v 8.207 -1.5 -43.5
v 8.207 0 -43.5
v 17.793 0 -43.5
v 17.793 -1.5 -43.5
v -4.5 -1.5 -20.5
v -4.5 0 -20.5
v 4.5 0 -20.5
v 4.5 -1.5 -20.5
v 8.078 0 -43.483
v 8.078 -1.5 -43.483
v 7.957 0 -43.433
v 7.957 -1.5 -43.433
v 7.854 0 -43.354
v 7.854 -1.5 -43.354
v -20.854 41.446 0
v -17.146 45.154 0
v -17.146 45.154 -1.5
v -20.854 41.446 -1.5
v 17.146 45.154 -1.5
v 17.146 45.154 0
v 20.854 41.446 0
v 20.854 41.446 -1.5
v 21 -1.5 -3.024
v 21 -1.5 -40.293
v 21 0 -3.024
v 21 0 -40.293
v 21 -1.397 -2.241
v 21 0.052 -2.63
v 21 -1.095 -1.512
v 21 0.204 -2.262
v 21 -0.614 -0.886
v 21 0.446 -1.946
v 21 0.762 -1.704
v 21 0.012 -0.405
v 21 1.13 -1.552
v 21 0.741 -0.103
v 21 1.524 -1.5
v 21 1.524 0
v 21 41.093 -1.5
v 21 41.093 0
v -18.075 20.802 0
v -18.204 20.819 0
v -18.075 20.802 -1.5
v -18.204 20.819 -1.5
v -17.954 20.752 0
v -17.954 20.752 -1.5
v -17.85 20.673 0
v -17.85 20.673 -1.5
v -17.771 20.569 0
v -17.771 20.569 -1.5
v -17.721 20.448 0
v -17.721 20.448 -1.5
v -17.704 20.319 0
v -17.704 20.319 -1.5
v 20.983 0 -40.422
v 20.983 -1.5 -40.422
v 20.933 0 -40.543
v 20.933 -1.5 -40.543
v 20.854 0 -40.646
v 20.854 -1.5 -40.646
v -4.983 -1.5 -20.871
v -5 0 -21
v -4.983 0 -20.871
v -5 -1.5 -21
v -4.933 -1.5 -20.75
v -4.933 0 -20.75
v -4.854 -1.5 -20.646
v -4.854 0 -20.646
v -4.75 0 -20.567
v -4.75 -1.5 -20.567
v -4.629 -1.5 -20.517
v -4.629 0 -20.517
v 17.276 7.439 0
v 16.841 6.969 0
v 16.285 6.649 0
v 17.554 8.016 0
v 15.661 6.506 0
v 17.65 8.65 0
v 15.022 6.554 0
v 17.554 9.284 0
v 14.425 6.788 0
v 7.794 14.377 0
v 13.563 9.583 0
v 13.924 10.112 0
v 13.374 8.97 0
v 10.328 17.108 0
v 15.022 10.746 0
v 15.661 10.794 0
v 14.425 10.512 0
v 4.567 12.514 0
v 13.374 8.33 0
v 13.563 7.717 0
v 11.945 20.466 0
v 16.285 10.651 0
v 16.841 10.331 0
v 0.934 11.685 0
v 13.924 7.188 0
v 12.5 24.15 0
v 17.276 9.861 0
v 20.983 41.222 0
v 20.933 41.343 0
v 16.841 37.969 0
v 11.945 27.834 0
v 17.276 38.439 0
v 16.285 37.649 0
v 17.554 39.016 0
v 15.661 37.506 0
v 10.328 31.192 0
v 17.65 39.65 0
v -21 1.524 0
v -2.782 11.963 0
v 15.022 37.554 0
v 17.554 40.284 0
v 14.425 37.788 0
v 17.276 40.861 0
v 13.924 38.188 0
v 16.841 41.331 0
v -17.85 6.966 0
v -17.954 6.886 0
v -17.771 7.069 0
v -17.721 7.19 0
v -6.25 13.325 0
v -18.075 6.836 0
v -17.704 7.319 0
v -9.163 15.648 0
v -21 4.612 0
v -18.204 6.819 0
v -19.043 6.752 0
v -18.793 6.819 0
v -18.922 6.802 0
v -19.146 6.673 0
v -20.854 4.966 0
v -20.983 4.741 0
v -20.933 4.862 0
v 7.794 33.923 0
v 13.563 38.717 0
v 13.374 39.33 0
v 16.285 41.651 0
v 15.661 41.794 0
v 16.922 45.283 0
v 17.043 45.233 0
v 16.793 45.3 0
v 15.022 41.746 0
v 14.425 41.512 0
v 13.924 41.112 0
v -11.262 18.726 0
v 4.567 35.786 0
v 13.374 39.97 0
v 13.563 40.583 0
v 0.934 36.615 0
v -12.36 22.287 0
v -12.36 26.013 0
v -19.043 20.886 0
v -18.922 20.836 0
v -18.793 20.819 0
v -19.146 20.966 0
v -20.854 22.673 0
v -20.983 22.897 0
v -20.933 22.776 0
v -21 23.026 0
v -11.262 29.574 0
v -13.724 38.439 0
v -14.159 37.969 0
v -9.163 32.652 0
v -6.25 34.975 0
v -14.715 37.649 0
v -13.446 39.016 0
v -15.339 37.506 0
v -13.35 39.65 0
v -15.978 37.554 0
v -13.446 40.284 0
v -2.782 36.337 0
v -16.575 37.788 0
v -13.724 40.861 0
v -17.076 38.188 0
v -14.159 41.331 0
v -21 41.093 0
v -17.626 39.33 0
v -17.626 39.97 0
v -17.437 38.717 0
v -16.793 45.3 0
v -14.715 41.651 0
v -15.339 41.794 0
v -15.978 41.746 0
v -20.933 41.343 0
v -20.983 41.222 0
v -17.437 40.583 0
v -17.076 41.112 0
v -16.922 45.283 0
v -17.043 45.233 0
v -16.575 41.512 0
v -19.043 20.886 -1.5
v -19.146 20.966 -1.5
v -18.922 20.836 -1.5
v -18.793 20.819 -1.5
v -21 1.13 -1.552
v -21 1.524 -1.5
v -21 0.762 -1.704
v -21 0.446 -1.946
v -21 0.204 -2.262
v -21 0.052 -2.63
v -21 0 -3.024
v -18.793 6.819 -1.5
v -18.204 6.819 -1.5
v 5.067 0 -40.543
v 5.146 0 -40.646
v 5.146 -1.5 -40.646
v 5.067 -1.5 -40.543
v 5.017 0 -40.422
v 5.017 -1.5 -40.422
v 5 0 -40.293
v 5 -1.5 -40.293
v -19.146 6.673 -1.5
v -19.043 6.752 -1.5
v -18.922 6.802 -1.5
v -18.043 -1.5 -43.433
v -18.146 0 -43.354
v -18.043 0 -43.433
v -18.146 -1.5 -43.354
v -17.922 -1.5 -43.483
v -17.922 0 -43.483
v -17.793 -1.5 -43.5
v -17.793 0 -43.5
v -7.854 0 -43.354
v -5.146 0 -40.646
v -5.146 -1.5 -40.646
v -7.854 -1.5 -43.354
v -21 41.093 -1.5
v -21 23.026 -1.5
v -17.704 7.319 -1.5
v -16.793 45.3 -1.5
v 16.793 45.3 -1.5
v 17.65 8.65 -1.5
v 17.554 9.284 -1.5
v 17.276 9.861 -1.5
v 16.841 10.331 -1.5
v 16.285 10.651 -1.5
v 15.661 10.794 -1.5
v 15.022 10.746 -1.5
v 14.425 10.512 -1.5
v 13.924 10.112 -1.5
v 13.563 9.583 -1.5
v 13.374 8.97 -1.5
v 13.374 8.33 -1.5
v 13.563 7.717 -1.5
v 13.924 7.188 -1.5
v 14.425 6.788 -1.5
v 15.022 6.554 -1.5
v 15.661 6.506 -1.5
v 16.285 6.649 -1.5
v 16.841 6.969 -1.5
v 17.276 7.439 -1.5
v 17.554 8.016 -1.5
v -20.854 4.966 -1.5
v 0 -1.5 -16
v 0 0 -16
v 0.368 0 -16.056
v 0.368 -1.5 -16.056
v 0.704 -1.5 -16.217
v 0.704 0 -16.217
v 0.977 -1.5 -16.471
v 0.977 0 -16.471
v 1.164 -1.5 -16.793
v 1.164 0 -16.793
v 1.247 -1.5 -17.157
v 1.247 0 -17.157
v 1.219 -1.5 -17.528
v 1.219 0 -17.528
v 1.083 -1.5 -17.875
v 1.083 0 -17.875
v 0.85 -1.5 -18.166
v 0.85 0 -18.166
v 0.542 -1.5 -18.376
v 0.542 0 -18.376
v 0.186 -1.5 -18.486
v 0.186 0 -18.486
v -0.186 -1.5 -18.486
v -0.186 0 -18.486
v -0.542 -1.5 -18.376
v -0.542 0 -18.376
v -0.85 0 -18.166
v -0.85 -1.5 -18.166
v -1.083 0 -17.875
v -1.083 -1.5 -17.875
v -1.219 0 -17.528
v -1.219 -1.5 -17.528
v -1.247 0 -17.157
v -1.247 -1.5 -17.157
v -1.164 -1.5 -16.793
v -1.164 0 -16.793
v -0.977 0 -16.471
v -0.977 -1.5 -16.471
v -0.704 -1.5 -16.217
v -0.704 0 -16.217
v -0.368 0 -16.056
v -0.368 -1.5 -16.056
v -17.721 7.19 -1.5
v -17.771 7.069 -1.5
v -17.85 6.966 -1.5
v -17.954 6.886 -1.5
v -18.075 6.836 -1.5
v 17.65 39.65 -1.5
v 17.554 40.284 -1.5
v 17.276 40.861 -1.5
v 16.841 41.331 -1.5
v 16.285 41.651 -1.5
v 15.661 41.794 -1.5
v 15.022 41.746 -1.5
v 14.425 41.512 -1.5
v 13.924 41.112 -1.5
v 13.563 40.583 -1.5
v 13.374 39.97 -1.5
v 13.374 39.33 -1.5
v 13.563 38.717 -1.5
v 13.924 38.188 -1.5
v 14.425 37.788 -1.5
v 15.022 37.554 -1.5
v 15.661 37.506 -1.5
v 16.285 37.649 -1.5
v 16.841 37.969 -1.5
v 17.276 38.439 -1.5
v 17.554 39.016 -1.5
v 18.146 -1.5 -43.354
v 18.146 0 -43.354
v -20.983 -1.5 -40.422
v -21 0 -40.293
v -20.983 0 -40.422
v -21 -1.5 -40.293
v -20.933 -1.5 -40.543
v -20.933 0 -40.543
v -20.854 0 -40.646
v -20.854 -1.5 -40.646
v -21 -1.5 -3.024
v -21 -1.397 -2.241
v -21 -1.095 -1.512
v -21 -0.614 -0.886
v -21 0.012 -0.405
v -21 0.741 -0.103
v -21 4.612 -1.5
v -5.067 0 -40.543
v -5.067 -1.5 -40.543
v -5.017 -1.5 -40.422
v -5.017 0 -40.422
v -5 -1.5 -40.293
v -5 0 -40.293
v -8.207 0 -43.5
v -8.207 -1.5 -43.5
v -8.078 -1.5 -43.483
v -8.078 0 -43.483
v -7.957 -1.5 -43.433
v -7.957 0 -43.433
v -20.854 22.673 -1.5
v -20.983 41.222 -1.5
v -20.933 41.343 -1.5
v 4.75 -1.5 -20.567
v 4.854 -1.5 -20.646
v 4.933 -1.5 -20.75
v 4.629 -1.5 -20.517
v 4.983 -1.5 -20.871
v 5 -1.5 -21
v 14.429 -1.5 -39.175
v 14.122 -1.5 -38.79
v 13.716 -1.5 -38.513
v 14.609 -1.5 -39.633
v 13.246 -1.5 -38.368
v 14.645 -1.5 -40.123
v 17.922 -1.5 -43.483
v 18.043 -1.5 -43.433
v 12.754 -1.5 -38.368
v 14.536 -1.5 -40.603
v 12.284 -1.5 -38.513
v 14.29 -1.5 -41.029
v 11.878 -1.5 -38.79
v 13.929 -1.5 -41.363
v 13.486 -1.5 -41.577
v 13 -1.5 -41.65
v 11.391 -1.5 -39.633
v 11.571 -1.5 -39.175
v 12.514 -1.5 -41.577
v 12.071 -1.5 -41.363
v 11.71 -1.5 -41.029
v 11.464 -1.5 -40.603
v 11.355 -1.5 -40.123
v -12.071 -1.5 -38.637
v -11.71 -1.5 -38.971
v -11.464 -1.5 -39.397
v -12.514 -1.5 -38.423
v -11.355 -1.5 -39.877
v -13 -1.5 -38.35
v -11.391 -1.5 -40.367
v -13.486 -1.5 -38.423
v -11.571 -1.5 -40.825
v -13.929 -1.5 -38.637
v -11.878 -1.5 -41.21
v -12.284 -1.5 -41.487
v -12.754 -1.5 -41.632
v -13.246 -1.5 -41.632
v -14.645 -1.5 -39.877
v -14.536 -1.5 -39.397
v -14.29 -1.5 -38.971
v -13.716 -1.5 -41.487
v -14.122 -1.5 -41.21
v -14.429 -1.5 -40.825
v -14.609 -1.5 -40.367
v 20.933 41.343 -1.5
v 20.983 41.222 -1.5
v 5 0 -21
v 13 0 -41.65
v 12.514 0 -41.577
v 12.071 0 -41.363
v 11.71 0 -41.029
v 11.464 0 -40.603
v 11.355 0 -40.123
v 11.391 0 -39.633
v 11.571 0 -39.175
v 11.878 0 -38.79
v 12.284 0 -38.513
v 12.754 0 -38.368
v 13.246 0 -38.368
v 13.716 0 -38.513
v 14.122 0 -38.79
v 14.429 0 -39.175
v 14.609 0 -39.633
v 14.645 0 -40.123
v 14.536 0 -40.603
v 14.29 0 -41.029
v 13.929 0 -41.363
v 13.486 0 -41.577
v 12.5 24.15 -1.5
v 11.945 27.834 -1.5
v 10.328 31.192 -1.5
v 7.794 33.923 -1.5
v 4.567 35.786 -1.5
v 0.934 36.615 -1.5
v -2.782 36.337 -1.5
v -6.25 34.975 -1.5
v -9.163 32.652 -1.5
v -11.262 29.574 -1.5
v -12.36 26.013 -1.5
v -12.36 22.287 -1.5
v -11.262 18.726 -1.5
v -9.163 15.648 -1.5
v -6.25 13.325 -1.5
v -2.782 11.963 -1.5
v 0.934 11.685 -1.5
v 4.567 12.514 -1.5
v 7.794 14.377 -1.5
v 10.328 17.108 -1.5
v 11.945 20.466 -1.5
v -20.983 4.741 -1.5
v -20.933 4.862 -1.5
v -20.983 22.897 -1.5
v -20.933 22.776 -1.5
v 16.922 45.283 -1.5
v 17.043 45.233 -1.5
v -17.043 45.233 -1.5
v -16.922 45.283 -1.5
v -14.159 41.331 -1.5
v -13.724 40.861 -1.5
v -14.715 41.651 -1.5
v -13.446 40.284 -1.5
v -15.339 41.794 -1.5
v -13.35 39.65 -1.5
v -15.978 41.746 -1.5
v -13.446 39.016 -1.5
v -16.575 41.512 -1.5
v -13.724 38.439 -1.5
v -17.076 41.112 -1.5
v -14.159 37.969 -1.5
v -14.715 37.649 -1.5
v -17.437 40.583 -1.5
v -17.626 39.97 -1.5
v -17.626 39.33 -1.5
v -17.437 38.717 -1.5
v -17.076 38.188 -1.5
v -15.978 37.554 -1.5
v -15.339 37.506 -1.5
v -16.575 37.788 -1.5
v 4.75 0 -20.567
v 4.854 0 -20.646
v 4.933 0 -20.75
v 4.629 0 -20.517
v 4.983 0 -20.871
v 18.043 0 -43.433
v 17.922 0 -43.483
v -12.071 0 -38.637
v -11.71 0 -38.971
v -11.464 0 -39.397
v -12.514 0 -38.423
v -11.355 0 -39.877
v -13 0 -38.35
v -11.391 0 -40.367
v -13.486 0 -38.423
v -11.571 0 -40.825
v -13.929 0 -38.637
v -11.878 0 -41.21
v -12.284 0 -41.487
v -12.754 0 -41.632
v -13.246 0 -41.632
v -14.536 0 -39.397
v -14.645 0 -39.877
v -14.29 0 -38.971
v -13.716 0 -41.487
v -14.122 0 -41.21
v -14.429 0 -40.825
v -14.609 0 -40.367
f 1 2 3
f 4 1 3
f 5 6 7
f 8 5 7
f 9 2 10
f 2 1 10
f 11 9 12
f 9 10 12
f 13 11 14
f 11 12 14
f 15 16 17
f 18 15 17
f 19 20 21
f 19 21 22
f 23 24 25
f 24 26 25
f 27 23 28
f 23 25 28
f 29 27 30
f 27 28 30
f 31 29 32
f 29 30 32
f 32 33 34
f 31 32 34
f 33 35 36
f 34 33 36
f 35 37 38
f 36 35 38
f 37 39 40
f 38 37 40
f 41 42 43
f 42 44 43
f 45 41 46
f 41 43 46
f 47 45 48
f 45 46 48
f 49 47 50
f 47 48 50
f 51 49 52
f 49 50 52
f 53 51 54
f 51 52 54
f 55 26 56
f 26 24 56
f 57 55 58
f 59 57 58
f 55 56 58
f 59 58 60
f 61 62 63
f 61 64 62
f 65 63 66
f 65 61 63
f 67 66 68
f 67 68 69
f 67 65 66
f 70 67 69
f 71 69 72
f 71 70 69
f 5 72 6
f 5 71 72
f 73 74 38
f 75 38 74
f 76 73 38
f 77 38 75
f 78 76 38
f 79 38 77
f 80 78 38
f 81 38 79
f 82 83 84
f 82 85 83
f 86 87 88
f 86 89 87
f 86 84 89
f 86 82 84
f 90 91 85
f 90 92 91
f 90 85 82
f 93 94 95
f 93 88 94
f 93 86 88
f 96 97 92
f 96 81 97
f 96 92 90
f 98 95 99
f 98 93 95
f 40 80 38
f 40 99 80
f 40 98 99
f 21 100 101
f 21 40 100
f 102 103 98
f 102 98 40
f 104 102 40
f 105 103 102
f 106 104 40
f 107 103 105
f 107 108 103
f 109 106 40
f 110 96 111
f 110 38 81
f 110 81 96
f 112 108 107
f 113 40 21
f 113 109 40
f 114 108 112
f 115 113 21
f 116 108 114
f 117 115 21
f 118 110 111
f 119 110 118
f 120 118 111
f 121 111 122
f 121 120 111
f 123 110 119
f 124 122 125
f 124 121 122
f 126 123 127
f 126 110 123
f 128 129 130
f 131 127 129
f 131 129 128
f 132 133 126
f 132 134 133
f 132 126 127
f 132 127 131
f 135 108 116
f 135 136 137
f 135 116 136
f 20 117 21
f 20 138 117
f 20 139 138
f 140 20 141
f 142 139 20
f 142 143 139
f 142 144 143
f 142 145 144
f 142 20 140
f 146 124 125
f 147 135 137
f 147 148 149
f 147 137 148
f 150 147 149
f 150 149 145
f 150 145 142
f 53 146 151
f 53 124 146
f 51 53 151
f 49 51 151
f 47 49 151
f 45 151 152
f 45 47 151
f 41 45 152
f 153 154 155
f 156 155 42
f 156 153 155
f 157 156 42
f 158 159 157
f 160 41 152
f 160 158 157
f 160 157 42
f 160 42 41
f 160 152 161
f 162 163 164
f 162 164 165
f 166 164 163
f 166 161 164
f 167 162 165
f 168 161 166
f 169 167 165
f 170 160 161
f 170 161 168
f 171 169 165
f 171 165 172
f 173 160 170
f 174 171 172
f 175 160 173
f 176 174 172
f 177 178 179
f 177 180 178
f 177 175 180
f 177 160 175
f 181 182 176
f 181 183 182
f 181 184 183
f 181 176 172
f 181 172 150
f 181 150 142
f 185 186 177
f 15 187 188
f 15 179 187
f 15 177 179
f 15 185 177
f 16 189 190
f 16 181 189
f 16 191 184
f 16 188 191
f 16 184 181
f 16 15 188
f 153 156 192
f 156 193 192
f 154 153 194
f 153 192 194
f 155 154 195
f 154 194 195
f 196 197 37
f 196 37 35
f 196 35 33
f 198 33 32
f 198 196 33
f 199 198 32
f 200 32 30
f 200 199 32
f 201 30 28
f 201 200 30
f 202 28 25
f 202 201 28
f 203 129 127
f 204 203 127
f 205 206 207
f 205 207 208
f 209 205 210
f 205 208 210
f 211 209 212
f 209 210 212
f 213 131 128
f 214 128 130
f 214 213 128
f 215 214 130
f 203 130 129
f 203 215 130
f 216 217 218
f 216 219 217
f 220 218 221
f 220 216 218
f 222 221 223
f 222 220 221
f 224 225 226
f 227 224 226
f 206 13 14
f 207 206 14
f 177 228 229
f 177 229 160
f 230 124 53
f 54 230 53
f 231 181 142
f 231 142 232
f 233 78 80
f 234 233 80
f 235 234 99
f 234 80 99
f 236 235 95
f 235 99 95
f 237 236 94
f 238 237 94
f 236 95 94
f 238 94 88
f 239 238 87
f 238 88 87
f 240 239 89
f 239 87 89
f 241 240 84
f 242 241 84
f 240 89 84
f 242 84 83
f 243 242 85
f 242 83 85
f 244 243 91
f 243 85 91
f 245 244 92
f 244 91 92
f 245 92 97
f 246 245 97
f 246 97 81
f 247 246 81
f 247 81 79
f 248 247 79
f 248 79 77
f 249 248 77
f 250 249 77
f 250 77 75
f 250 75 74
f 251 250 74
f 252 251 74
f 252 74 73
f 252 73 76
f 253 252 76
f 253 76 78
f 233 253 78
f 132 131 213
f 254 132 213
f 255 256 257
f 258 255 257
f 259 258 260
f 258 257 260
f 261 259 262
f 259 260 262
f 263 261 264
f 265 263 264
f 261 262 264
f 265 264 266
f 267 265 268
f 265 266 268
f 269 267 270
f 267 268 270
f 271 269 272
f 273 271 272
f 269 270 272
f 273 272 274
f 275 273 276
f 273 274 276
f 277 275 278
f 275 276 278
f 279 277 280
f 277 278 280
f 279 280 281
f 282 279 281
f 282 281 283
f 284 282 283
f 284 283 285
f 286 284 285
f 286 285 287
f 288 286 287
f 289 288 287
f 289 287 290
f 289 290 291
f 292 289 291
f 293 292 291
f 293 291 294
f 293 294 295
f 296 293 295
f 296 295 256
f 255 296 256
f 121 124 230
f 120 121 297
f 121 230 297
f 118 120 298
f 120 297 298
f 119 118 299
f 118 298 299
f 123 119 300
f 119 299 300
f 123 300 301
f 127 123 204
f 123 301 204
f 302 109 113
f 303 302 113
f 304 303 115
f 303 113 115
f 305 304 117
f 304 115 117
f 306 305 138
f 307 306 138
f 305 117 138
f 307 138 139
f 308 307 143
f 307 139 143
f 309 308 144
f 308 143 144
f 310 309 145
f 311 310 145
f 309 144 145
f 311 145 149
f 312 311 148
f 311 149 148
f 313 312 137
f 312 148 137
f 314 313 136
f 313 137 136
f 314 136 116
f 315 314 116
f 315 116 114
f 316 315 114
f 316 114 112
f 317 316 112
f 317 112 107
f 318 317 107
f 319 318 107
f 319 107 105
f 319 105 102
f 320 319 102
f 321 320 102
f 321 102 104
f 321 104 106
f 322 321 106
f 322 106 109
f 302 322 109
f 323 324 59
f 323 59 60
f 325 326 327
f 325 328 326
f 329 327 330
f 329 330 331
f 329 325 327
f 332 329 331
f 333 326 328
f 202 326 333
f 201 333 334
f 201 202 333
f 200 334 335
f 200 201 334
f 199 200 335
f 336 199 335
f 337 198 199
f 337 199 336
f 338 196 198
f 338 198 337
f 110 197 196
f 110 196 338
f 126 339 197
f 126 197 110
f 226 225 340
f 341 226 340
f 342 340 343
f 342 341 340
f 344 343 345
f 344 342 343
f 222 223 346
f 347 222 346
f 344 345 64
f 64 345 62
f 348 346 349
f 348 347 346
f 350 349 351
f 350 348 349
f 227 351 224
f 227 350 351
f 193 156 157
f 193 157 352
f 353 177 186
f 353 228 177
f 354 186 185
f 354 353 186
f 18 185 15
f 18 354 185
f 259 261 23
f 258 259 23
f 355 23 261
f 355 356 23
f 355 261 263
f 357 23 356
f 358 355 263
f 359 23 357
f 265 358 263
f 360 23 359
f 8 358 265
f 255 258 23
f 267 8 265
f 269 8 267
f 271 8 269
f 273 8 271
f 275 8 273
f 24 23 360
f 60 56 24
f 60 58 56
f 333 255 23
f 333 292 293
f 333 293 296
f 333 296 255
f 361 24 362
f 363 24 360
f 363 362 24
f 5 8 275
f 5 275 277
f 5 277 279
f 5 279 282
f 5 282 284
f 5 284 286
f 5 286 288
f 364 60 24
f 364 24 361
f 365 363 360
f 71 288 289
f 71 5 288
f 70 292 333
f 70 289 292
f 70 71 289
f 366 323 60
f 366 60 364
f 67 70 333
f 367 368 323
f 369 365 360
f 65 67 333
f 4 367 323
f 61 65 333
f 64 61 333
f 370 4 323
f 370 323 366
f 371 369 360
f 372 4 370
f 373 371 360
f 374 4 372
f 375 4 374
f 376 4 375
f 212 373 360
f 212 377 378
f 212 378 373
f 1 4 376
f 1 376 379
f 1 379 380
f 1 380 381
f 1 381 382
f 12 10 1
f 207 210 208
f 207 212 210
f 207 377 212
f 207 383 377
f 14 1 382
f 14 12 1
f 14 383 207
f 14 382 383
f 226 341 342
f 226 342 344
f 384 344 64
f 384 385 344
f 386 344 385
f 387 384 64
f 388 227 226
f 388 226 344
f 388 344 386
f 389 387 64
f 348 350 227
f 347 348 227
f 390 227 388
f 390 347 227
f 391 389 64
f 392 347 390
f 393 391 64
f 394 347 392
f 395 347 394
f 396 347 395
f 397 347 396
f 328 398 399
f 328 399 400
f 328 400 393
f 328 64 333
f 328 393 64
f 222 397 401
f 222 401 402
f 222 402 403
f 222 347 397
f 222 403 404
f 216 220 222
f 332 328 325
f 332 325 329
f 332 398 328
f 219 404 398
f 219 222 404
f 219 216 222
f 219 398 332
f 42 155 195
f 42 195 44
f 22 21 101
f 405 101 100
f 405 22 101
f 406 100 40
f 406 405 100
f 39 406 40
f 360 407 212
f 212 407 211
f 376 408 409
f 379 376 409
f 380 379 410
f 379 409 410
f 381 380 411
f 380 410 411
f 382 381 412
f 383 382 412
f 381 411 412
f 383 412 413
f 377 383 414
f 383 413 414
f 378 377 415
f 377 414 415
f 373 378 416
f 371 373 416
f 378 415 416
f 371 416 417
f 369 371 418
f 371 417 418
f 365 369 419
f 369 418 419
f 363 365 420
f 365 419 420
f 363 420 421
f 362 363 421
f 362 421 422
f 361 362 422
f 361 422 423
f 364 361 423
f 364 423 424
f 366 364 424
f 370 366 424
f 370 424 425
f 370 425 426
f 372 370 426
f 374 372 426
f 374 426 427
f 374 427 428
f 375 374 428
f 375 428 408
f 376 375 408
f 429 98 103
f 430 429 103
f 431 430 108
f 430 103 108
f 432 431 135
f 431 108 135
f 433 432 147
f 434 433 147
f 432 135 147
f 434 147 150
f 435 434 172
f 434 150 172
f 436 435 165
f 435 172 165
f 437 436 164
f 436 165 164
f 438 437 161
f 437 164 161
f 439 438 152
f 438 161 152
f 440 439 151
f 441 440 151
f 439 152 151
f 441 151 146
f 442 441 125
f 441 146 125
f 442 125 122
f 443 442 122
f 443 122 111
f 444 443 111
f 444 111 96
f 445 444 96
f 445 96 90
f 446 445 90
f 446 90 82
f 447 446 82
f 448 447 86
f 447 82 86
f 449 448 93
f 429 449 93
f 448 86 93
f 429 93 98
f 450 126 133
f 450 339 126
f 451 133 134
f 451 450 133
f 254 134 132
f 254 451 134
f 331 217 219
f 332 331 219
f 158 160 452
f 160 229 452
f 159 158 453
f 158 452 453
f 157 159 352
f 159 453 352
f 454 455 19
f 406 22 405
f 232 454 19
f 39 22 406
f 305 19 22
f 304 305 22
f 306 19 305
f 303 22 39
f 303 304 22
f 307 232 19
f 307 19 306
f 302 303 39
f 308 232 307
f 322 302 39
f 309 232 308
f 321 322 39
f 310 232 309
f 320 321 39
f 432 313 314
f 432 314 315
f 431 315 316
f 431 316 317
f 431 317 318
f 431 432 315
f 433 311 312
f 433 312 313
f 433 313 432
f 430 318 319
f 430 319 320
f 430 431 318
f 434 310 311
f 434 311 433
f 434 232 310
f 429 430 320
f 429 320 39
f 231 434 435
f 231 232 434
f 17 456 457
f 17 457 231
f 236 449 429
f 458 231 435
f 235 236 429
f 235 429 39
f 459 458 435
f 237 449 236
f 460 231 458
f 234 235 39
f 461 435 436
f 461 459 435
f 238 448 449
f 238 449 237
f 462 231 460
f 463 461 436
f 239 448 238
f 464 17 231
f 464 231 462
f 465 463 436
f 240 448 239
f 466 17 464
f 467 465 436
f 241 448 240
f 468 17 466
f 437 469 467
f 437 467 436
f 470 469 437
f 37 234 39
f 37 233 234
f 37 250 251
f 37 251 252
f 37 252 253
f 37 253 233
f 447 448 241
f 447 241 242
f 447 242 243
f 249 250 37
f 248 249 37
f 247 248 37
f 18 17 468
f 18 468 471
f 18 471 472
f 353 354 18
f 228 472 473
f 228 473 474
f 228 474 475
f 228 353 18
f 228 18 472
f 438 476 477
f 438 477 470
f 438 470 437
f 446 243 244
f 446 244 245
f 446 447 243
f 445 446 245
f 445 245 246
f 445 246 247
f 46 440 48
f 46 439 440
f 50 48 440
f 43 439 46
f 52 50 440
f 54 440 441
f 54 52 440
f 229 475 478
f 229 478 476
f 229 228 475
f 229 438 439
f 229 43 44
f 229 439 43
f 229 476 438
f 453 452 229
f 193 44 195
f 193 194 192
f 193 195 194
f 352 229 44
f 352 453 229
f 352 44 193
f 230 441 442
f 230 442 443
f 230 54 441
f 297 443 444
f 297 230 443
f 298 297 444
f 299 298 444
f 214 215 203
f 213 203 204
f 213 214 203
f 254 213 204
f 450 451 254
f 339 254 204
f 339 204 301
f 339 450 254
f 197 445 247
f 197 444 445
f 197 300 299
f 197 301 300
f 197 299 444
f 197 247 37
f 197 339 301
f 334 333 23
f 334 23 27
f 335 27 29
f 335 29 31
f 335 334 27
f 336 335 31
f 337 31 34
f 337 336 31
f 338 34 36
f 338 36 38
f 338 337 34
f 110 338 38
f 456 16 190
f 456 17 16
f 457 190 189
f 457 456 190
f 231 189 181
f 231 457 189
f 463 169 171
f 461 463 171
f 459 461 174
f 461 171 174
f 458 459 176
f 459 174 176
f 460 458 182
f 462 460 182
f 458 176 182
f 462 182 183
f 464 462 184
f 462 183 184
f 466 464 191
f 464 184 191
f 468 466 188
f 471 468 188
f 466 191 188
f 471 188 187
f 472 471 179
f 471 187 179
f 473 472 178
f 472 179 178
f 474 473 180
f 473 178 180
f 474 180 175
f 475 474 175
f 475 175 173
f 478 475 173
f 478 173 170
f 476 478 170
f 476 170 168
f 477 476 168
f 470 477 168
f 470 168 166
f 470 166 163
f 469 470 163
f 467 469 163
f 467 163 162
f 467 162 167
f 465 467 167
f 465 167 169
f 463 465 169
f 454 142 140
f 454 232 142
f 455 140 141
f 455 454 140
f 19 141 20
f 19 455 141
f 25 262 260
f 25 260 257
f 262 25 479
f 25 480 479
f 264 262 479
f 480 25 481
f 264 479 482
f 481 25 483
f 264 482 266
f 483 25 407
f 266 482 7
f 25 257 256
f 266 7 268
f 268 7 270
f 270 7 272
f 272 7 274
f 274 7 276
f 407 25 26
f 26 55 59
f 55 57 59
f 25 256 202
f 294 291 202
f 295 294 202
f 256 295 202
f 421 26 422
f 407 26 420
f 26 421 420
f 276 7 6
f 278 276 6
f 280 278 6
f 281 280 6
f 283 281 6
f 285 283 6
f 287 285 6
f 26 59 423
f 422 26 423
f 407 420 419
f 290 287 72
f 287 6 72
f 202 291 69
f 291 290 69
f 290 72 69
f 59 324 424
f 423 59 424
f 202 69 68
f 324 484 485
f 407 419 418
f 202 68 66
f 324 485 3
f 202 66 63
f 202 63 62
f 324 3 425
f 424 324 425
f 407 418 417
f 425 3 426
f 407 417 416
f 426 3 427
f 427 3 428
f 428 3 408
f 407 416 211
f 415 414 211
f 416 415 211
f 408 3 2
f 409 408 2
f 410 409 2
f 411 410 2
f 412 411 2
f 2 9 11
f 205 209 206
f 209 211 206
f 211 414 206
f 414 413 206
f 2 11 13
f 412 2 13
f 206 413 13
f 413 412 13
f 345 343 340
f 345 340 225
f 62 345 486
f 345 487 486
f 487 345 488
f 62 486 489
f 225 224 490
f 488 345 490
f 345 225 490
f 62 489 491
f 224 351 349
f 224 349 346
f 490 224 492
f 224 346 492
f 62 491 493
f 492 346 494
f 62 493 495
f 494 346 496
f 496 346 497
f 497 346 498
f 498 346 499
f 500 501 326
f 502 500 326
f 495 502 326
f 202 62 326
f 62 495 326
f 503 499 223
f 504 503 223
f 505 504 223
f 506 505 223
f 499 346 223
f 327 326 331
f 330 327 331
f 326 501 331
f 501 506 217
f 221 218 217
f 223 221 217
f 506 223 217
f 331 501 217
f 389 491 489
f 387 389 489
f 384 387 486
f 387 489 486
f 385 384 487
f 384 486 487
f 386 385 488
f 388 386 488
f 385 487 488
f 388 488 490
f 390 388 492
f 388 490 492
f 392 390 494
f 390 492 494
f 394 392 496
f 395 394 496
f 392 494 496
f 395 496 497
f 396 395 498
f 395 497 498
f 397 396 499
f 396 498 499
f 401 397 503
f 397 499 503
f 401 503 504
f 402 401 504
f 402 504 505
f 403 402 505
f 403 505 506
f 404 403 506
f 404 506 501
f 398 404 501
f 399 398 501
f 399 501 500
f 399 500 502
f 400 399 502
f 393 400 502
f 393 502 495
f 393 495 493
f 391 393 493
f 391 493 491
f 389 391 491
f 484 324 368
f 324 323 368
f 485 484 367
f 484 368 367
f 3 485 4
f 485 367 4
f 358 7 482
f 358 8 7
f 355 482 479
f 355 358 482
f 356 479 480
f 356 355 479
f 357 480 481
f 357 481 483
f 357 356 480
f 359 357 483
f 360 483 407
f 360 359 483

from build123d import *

# Parameters (mm, degrees)
BASE_FLANGE1_DEPTH           = 1.5
EDGE_FLANGE1_STRIP_W         = 9.048
EDGE_FLANGE1_STRIP_H         = 1.5
EDGE_FLANGE1_STRIP_CUT_DEPTH = 42
EDGE_FLANGE1_DEPTH           = 42
SKETCH9_R                    = 12.5
CUT_EXTRUDE1_DEPTH           = 1.5
SKETCH10_R                   = 2.15
CUT_EXTRUDE2_DEPTH           = 67.221899701
SKETCH11_R                   = 1.65
CUT_EXTRUDE3_DEPTH           = 67.221899701
CHAMFER1_SIZE                = 4
CHAMFER2_SIZE                = 3
SKETCH12_W                   = 3.295995972
SKETCH12_H                   = 14
CUT_EXTRUDE4_DEPTH           = 67.221899701
CHAMFER3_SIZE                = 2
SKETCH13_R                   = 1.25
CUT_EXTRUDE5_DEPTH           = 67.221899701
FILLET1_R                    = 0.5


# Sheet-metal steps are written as plain solids
with BuildPart() as part:
    # Sketch1 → Base-Flange1 (new body)
    with BuildSketch(Plane(origin=(0, 0, 0), x_dir=(1, 0, 0), z_dir=(0, 1, 0))):
        Polygon((-21, 43.5), (-5, 43.5), (-5, 20.5), (5, 20.5), (5, 43.5), (21, 43.5), (21, 0), (-21, 0), align=None)
    extrude(amount=-BASE_FLANGE1_DEPTH)

    # Edge-Flange1 strip (across the edge) → Edge-Flange1 strip cut (cut)
    with BuildSketch(Plane(origin=(-21, 0, 0), x_dir=(0, 0, -1), z_dir=(1, 0, 0))):
        with Locations((-1.5, -0.75)):
            Rectangle(EDGE_FLANGE1_STRIP_W, EDGE_FLANGE1_STRIP_H)
    extrude(amount=EDGE_FLANGE1_STRIP_CUT_DEPTH, mode=Mode.SUBTRACT)

    # Edge-Flange1 section (across the edge) → Edge-Flange1 (add)
    with BuildSketch(Plane(origin=(-21, 0, 0), x_dir=(0, 0, -1), z_dir=(1, 0, 0))):
        with BuildLine():
            Line((0, 1.524), (0, 45.3))
            Line((0, 45.3), (1.5, 45.3))
            Line((1.5, 45.3), (1.5, 1.524))
            ThreePointArc((1.5, 1.524), (1.946369265, 0.446369265), (3.024, 0))
            Line((3.024, 0), (3.024, -1.5))
            ThreePointArc((3.024, -1.5), (0.885709094, -0.614290906), (0, 1.524))
        make_face()
    extrude(amount=EDGE_FLANGE1_DEPTH)

    # Sketch9 → Cut-Extrude1 (cut)
    with BuildSketch(Plane.XY):
        with Locations((0, 24.15)):
            Circle(SKETCH9_R)
    extrude(amount=-CUT_EXTRUDE1_DEPTH, mode=Mode.SUBTRACT)

    # Sketch10 → Cut-Extrude2 (cut, through all)
    with BuildSketch(Plane.XY):
        with Locations((-15.5, 39.65)):
            Circle(SKETCH10_R)
        with Locations((15.5, 39.65)):
            Circle(SKETCH10_R)
        with Locations((15.5, 8.65)):
            Circle(SKETCH10_R)
    extrude(amount=-CUT_EXTRUDE2_DEPTH, mode=Mode.SUBTRACT)

    # Sketch11 → Cut-Extrude3 (cut, through all)
    with BuildSketch(Plane(origin=(0, 0, 0), x_dir=(1, 0, 0), z_dir=(0, 1, 0))):
        with Locations(Location((-13, 40, 0), (0, 0, 270))):
            Circle(SKETCH11_R)
        with Locations(Location((13, 40, 0), (0, 0, 90))):
            Circle(SKETCH11_R)
    extrude(amount=-CUT_EXTRUDE3_DEPTH, mode=Mode.SUBTRACT)

    # Chamfer1
    chamfer1_edges = [part.edges().sort_by_distance(p)[0] for p in [
        (-21, 45.3, -0.75),
        (21, 45.3, -0.75),
    ]]
    chamfer(chamfer1_edges, length=CHAMFER1_SIZE)

    # Chamfer2
    chamfer2_edges = [part.edges().sort_by_distance(p)[0] for p in [
        (-21, -0.75, -43.5),
        (-5, -0.75, -43.5),
        (5, -0.75, -43.5),
        (21, -0.75, -43.5),
    ]]
    chamfer(chamfer2_edges, length=CHAMFER2_SIZE)

    # Sketch12 → Cut-Extrude4 (cut, through all)
    with BuildSketch(Plane.XY):
        with Locations((-19.352002014, 13.819078659)):
            Rectangle(SKETCH12_W, SKETCH12_H)
    extrude(amount=-CUT_EXTRUDE4_DEPTH, mode=Mode.SUBTRACT)

    # Chamfer3
    chamfer3_edges = [part.edges().sort_by_distance(p)[0] for p in [
        (-21, 6.819078659, -0.75),
        (-21, 20.819078659, -0.75),
    ]]
    chamfer(chamfer3_edges, length=CHAMFER3_SIZE)

    # Sketch13 → Cut-Extrude5 (cut, through all)
    with BuildSketch(Plane(origin=(0, 0, 0), x_dir=(1, 0, 0), z_dir=(0, 1, 0))):
        with Locations(Location((0, 17.25, 0), (0, 0, 270))):
            Circle(SKETCH13_R)
    extrude(amount=-CUT_EXTRUDE5_DEPTH, mode=Mode.SUBTRACT)

    # Fillet1
    fillet1_edges = [part.edges().sort_by_distance(p)[0] for p in [
        (21, 41.3, -0.75),
        (-8, -0.75, -43.5),
        (-18, -0.75, -43.5),
        (-21, -0.75, -40.5),
        (21, -0.75, -40.5),
        (8, -0.75, -43.5),
        (18, -0.75, -43.5),
        (-5, -0.75, -40.5),
        (5, -0.75, -40.5),
        (-5, -0.75, -20.5),
        (5, -0.75, -20.5),
        (-17.704004028, 20.819078659, -0.75),
        (-17.704004028, 6.819078659, -0.75),
        (-19, 6.819078659, -0.75),
        (-21, 4.819078659, -0.75),
        (-21, 22.819078659, -0.75),
        (-19, 20.819078659, -0.75),
        (-21, 41.3, -0.75),
        (17, 45.3, -0.75),
        (-17, 45.3, -0.75),
    ]]
    fillet(fillet1_edges, radius=FILLET1_R)


solid = part.part
